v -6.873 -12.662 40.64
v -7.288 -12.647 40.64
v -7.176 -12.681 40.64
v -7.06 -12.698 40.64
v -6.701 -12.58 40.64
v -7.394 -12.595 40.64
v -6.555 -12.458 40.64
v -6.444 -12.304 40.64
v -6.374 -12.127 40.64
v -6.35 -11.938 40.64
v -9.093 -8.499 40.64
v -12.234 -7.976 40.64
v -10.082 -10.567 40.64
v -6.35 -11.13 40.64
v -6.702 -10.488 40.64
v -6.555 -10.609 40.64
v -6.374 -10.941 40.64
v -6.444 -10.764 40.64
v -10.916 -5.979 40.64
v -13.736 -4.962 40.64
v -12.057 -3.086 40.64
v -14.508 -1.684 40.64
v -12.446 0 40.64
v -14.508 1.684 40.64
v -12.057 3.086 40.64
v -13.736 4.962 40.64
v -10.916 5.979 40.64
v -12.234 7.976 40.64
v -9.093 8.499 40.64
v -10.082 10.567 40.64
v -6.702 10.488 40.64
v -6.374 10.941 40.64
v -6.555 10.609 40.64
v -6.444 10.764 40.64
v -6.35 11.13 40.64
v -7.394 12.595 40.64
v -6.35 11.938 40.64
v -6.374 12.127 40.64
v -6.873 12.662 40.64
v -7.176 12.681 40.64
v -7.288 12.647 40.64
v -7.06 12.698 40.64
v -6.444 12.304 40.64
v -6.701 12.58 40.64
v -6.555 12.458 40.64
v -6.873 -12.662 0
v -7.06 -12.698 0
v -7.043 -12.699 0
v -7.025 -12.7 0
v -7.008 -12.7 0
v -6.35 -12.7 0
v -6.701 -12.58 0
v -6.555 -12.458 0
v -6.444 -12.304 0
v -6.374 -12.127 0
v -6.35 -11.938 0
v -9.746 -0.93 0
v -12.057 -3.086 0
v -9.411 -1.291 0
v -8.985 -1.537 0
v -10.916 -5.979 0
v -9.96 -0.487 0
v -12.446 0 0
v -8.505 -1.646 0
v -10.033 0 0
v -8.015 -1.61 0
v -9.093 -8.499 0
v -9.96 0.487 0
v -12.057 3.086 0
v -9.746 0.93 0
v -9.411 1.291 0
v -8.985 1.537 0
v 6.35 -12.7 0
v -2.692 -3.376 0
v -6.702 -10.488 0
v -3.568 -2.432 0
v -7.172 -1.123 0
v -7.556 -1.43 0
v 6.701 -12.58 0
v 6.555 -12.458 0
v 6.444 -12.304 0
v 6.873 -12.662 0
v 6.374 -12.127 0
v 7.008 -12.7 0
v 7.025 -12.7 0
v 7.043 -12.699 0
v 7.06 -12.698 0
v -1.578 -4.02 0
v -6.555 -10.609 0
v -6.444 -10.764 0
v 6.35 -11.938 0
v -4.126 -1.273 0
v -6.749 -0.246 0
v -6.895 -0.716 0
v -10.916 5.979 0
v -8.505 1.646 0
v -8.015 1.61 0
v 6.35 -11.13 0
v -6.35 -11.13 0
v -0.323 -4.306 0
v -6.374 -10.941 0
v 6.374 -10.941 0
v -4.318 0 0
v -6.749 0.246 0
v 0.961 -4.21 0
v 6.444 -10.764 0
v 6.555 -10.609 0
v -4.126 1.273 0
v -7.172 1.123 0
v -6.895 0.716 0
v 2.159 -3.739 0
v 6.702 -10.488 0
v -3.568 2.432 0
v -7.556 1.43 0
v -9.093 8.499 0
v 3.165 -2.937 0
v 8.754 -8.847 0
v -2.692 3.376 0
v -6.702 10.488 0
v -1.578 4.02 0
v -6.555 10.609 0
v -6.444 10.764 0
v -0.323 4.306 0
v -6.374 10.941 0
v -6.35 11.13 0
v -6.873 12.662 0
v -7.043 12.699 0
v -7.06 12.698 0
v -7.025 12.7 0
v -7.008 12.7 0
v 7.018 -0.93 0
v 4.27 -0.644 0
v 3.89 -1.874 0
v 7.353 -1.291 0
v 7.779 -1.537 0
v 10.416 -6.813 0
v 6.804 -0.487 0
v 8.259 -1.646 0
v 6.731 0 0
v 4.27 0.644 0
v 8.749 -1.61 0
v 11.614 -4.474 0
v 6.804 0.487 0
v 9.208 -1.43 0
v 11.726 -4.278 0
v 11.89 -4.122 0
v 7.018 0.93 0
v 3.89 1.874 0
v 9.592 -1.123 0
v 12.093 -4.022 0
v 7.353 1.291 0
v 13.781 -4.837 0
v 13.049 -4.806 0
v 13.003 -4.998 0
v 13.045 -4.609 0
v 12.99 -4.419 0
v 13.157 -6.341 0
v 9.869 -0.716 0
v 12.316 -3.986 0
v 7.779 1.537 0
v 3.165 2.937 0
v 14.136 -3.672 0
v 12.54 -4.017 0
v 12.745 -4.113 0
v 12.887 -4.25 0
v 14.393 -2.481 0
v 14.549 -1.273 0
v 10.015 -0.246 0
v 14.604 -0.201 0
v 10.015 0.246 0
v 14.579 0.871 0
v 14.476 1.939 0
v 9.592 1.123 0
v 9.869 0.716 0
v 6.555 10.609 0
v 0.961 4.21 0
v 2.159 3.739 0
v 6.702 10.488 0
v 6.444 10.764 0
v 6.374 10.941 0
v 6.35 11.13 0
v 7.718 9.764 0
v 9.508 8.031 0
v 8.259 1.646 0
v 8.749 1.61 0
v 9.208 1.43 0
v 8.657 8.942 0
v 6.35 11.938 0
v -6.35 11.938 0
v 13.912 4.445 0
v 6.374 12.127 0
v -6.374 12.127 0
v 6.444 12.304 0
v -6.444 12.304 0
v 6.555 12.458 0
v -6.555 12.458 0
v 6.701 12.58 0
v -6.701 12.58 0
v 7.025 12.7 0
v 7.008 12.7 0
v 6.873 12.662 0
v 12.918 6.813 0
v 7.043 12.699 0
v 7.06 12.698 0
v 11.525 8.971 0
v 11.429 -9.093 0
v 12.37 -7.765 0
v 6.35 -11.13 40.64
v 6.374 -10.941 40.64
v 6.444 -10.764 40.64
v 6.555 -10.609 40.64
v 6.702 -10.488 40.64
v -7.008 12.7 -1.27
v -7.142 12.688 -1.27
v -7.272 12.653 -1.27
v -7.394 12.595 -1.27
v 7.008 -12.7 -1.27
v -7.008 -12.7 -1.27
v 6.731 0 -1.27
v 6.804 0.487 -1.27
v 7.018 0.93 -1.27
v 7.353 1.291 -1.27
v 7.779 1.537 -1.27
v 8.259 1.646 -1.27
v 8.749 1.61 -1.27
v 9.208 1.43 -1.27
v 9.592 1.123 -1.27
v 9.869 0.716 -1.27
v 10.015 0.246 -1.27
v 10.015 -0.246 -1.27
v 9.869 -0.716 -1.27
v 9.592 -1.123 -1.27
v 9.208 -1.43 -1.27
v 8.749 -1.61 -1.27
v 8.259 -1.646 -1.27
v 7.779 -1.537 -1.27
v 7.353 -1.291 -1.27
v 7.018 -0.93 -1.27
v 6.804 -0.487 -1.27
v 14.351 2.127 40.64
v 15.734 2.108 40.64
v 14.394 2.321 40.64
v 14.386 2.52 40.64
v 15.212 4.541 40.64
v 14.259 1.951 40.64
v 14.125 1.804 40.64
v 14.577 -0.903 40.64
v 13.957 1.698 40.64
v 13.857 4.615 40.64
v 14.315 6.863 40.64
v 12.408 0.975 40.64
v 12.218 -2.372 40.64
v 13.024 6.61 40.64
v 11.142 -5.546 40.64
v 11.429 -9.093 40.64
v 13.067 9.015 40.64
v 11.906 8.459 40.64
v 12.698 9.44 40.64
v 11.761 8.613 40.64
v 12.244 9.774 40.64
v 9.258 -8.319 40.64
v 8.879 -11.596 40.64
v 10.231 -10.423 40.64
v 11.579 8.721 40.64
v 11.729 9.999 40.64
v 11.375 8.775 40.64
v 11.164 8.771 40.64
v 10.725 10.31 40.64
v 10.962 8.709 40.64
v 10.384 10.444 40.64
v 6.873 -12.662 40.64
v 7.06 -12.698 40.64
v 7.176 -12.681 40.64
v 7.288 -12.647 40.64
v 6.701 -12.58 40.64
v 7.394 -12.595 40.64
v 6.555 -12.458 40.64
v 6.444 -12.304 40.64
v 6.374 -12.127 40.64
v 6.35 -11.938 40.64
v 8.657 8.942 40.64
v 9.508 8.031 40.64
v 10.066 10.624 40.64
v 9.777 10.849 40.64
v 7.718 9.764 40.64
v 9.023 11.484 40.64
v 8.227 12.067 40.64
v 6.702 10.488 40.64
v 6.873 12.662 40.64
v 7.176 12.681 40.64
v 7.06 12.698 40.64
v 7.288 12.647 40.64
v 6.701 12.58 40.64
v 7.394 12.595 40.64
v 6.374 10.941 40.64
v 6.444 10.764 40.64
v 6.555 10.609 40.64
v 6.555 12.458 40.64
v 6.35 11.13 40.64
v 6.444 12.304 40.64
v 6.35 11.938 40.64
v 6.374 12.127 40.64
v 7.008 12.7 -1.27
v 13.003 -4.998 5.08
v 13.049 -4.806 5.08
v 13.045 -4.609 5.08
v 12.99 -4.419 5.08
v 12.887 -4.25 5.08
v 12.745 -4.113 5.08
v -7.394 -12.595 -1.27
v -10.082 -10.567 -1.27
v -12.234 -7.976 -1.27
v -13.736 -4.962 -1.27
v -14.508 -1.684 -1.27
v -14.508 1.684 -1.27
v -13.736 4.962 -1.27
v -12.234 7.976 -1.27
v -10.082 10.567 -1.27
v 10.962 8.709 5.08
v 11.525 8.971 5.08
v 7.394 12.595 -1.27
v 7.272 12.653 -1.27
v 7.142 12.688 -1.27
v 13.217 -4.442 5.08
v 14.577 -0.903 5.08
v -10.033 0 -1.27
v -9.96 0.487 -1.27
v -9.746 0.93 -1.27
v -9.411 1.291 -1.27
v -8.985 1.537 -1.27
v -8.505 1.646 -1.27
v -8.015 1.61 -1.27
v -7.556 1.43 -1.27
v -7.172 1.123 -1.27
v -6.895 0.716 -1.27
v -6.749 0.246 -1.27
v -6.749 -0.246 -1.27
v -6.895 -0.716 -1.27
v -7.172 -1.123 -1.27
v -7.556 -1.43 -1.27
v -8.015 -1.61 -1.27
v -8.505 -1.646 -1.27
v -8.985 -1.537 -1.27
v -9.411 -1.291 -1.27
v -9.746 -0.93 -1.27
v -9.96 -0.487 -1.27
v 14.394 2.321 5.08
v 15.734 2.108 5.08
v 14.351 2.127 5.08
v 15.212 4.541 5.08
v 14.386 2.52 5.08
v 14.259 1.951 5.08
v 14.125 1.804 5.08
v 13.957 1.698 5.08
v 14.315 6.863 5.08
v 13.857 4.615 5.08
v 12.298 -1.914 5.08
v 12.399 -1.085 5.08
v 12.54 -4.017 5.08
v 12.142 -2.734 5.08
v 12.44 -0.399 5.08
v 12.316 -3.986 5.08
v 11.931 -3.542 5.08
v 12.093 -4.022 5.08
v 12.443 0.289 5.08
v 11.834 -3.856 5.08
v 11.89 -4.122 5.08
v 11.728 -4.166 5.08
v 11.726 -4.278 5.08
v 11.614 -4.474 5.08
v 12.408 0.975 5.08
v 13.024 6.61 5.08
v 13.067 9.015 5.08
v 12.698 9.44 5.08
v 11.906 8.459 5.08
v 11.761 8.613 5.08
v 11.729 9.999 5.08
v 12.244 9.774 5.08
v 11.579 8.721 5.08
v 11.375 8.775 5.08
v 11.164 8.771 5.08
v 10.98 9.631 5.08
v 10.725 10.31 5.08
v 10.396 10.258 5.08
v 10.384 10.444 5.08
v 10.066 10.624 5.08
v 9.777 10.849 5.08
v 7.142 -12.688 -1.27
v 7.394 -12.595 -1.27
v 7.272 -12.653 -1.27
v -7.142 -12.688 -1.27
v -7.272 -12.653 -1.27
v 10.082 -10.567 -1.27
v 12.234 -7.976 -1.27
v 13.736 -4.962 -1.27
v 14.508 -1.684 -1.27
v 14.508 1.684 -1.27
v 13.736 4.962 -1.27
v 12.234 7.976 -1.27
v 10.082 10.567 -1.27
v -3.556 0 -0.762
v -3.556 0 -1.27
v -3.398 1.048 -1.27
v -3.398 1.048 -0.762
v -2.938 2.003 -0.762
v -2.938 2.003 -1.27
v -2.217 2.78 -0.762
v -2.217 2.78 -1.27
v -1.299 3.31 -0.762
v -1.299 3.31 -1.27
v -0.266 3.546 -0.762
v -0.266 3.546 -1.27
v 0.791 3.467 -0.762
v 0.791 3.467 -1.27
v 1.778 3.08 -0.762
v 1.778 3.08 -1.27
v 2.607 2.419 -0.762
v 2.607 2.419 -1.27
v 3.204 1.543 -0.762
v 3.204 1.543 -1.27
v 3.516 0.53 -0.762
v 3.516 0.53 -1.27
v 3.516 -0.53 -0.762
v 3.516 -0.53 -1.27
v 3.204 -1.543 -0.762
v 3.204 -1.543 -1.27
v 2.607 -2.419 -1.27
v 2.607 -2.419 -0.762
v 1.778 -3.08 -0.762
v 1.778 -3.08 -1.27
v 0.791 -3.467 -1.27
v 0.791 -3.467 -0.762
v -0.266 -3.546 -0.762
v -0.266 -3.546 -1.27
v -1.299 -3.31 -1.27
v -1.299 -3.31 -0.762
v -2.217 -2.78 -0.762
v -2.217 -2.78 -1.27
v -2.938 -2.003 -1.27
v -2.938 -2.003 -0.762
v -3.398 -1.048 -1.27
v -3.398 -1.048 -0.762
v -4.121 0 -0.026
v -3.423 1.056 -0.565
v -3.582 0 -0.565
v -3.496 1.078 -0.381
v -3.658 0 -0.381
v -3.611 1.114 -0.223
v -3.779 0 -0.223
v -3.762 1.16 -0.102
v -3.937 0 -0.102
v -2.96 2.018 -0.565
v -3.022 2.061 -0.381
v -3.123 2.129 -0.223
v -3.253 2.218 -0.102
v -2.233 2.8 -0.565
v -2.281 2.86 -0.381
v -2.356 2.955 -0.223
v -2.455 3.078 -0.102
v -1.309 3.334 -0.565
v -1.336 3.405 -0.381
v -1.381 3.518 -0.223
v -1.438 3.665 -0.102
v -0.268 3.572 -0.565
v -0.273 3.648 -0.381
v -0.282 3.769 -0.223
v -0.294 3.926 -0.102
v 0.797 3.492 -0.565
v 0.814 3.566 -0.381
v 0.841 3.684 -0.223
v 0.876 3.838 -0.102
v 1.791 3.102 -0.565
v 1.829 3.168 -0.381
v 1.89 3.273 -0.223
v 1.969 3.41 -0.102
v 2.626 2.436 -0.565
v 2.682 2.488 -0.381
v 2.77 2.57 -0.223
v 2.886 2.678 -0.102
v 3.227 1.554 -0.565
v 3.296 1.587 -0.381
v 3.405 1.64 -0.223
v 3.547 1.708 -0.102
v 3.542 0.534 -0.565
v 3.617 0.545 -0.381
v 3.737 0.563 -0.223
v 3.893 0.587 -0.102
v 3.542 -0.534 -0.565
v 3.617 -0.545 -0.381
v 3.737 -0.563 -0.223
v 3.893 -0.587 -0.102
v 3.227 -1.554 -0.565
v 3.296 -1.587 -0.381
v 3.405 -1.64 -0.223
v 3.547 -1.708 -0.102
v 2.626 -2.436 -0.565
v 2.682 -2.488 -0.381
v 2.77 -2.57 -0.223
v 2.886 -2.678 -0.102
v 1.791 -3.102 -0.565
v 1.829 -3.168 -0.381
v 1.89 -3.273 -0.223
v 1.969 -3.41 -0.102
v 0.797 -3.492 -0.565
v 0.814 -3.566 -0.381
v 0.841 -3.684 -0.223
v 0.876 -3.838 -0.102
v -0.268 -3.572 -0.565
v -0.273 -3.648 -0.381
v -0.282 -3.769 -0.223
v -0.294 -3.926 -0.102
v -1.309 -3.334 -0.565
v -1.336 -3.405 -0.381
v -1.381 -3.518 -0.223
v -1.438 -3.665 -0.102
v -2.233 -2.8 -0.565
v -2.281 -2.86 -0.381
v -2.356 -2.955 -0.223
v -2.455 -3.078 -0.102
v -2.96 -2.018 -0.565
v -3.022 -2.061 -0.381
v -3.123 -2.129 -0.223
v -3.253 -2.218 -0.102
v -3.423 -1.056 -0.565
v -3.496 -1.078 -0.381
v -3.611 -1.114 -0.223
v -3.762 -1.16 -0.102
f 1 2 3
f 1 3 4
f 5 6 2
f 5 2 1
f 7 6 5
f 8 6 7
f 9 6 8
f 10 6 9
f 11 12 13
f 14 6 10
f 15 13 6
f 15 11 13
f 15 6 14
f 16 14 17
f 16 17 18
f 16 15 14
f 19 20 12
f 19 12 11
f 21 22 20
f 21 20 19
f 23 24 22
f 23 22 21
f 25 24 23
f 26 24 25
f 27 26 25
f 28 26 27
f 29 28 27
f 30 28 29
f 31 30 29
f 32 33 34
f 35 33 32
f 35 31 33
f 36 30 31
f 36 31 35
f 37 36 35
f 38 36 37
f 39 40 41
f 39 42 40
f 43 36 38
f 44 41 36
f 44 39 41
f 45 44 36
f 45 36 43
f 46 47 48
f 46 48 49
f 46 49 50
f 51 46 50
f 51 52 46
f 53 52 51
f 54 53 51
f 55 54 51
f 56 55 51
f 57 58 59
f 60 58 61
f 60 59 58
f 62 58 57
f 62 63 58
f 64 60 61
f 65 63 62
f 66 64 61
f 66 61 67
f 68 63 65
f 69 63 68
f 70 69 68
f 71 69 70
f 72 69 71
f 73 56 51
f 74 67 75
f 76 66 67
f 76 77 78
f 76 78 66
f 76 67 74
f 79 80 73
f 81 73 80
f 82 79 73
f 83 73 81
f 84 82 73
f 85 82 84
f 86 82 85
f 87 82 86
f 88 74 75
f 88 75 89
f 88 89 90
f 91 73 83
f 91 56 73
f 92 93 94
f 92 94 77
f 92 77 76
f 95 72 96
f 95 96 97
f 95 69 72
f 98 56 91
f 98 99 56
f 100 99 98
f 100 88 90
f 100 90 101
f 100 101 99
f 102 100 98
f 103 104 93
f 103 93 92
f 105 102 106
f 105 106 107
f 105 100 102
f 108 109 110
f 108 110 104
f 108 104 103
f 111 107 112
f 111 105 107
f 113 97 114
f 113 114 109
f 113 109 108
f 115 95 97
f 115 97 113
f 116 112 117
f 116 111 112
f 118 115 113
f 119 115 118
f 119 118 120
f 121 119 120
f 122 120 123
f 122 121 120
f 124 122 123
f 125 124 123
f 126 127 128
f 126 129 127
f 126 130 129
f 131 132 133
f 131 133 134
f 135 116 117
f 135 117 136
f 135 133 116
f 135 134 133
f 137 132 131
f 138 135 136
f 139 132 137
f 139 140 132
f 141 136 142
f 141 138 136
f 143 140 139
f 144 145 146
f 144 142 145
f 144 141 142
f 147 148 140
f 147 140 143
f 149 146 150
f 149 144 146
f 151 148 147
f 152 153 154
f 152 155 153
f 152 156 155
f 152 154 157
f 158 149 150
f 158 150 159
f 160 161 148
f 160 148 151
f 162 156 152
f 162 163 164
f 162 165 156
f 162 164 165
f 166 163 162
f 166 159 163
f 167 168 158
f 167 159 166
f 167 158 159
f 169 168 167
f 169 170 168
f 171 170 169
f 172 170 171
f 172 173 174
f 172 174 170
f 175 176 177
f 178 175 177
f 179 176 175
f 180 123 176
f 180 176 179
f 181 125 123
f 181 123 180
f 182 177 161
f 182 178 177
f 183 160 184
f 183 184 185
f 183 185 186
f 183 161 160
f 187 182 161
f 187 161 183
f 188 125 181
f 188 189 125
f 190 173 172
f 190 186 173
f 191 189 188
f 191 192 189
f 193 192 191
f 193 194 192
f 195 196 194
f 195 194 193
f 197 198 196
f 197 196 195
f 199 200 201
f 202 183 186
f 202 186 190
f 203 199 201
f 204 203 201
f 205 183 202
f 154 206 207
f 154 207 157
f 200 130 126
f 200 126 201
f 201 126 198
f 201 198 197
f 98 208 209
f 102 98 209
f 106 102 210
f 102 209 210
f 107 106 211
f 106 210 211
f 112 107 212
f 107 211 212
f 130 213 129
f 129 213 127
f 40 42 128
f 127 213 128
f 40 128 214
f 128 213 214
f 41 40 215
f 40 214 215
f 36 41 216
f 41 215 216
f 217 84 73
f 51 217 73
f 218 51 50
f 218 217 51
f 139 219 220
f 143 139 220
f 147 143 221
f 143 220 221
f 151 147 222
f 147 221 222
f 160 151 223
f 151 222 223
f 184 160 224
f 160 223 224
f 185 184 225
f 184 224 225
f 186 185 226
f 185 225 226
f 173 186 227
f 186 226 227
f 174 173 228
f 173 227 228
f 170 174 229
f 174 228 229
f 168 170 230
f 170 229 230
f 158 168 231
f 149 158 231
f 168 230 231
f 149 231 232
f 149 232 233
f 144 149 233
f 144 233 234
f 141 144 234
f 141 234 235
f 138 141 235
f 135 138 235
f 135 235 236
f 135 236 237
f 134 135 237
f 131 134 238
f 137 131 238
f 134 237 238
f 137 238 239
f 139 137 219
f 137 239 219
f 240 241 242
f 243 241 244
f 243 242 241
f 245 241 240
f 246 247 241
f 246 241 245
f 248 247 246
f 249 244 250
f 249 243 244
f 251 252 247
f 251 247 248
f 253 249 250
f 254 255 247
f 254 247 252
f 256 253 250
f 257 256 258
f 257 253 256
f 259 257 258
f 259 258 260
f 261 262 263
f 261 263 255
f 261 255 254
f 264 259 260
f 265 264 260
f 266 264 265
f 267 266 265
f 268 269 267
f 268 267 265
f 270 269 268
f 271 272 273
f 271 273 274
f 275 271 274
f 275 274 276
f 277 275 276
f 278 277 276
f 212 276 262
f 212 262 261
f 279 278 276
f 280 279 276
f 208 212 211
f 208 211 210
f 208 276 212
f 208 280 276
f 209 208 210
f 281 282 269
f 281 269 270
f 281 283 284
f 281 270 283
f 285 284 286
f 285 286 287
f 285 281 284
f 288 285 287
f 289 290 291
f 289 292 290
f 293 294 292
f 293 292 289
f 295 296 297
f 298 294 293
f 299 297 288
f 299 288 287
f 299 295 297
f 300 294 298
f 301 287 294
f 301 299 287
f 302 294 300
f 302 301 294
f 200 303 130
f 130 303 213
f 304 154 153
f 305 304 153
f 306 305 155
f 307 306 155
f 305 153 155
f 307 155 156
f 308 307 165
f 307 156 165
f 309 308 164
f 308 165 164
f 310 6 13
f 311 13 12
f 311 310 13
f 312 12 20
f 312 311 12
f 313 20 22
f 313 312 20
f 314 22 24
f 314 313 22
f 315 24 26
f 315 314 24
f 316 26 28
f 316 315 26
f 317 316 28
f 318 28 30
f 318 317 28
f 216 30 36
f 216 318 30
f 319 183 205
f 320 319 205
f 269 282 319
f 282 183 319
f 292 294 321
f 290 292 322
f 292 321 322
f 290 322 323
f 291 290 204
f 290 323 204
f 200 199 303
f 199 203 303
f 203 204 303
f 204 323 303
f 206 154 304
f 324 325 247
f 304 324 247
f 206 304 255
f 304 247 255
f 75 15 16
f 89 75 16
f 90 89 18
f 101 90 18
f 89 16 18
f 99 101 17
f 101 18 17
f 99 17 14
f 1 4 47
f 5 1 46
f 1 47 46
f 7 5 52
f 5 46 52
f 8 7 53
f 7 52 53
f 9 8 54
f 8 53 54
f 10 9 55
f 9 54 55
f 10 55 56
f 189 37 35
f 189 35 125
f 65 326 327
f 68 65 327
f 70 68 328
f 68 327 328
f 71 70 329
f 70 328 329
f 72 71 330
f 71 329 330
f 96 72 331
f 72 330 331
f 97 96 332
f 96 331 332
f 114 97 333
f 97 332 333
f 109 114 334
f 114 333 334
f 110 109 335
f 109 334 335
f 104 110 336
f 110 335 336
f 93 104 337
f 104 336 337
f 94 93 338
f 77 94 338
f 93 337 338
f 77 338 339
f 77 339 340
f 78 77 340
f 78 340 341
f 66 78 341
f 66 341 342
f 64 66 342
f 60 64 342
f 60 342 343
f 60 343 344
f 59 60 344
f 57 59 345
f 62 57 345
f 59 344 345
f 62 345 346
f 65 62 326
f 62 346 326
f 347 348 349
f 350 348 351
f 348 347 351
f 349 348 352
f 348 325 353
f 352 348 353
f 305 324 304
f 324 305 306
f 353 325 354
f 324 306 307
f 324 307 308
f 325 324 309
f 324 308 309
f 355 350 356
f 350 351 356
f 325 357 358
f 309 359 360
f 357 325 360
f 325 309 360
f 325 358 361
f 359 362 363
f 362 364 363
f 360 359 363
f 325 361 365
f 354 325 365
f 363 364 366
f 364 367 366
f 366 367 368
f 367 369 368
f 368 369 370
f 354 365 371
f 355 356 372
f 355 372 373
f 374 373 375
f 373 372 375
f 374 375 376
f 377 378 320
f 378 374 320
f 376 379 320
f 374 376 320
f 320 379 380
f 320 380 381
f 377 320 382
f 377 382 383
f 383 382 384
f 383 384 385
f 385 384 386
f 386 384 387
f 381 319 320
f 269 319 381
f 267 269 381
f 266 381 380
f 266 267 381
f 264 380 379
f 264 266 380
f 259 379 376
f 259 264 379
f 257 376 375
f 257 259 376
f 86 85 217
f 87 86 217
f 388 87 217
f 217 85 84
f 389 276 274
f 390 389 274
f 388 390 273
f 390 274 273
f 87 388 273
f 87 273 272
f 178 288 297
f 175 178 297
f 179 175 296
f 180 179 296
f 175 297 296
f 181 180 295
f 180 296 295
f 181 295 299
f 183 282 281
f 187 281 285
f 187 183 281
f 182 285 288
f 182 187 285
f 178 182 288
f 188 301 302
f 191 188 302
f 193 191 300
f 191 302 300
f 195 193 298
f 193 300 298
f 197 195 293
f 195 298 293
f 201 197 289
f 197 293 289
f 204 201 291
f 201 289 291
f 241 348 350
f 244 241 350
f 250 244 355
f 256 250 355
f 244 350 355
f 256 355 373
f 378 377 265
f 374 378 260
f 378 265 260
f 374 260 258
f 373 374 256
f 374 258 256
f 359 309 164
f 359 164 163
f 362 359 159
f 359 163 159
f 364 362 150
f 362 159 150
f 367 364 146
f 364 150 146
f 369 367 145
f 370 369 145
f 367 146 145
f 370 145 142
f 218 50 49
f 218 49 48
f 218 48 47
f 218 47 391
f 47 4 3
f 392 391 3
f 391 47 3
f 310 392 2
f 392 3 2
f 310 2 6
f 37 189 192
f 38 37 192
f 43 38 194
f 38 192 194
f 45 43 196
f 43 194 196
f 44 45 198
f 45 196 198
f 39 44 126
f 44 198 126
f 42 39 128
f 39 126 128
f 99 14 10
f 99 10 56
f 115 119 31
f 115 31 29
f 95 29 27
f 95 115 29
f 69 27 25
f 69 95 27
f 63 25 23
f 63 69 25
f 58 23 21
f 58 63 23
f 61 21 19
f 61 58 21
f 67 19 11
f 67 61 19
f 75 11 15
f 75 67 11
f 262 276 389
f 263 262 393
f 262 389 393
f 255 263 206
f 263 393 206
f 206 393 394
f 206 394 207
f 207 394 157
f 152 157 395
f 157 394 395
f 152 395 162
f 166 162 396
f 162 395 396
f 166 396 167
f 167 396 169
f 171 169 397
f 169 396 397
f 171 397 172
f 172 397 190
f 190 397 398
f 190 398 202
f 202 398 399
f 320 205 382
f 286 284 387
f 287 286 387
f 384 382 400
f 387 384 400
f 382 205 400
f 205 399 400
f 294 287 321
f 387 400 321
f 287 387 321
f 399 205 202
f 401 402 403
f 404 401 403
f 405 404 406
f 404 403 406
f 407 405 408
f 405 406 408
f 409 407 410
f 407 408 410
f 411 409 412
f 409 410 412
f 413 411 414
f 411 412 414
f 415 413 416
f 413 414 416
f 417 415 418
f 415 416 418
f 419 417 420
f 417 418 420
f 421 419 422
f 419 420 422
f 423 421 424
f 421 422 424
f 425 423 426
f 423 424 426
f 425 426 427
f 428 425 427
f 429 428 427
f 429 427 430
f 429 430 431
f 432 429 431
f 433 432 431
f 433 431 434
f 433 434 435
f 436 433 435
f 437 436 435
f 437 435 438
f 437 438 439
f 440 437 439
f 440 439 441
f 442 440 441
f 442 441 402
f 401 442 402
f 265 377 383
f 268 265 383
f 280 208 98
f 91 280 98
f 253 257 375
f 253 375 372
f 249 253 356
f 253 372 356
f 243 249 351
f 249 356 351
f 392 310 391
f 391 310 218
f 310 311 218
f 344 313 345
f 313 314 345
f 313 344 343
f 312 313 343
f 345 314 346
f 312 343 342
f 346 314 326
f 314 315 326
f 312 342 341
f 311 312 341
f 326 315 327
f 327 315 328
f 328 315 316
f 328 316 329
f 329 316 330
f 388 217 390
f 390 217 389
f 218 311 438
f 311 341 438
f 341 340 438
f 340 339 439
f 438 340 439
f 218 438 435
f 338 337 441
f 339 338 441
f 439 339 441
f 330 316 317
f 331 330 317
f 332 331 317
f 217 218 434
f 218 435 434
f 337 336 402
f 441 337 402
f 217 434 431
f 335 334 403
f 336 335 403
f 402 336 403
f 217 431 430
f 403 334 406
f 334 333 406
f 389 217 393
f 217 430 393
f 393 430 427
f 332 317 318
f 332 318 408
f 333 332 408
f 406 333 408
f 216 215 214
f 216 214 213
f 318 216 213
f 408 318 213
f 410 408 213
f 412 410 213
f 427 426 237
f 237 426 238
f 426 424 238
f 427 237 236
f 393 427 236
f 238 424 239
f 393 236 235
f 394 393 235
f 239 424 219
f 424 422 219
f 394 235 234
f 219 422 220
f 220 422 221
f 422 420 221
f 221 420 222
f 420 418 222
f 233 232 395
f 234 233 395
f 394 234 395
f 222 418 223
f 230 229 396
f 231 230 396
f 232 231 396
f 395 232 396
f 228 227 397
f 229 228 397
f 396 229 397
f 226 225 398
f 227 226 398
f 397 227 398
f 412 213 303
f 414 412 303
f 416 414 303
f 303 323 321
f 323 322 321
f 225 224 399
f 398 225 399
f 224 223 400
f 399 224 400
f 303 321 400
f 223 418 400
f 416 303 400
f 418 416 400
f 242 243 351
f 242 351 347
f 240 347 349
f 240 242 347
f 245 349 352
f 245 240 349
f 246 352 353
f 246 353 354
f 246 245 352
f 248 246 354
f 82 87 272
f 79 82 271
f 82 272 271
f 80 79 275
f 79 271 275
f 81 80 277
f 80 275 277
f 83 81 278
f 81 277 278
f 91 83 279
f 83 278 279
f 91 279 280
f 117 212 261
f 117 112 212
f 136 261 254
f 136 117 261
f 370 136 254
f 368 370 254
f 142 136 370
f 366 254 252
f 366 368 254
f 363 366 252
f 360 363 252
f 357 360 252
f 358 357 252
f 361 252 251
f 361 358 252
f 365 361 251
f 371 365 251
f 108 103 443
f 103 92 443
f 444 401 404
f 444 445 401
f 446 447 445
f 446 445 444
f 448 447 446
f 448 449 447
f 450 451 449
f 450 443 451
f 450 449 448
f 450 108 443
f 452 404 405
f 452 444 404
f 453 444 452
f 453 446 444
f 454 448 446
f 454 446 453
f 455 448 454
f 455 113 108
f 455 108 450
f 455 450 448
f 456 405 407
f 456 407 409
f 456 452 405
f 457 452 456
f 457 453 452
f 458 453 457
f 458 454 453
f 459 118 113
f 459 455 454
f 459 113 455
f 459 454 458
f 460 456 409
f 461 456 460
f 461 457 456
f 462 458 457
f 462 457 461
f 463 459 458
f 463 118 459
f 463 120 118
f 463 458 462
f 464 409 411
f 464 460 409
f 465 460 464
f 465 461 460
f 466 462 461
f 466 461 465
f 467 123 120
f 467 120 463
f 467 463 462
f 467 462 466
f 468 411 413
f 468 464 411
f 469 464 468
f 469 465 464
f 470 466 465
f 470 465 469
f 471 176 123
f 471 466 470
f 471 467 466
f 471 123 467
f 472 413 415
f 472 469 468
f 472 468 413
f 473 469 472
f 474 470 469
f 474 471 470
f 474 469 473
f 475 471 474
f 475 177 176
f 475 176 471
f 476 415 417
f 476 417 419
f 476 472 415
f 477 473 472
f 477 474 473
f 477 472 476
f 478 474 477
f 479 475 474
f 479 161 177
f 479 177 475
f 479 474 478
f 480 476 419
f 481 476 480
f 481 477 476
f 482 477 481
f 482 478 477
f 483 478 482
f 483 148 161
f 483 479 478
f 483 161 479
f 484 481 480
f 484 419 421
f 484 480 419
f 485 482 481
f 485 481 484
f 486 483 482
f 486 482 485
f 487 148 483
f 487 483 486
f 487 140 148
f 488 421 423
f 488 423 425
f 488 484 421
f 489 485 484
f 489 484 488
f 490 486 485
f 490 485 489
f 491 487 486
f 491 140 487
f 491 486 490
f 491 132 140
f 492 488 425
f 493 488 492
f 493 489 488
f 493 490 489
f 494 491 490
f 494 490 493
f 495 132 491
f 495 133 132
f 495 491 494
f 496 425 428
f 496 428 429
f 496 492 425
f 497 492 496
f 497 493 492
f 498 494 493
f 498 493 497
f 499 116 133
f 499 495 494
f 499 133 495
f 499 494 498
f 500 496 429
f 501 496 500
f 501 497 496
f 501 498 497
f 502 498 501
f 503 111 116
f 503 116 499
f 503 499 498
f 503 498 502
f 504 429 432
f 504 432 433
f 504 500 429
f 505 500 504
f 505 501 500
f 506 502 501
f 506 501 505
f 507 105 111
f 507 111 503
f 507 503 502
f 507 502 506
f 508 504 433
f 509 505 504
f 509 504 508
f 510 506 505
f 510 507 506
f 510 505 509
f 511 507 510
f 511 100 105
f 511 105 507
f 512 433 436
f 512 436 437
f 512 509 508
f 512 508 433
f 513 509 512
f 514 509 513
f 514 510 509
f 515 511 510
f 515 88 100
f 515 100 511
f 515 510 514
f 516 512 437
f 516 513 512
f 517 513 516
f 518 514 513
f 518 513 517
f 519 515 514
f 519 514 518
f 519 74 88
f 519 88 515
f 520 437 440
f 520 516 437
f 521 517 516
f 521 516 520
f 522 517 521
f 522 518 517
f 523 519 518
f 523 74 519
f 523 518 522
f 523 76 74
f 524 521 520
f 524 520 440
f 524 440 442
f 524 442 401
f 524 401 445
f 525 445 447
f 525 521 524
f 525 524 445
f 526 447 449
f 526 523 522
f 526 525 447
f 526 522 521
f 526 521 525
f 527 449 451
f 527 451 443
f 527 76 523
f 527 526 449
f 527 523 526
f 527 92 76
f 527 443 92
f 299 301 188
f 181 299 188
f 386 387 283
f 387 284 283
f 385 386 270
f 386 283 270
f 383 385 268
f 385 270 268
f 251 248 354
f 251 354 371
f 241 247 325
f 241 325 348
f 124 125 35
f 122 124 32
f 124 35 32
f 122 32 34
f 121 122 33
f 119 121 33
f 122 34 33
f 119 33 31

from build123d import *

# Parameters (mm, degrees)
SKETCH1_R           = 14.605
SKETCH1_R_2         = 12.446
BOSS_EXTRUDE1_DEPTH = 40.64
BOSS_EXTRUDE2_START = 1.27
SKETCH2_R           = 14.605
SKETCH2_R_2         = 3.556
SKETCH2_R_3         = 1.651
BOSS_EXTRUDE2_DEPTH = 1.27
SKETCH3_W           = 34.056453184
SKETCH3_H           = 6.418177278
SKETCH3_W_2         = 34.979066167
SKETCH3_H_2         = 5.575791511
CUT_EXTRUDE1_DEPTH  = 47.723229233
SKETCH4_W           = 12.7
SKETCH4_H           = 40.64
CUT_EXTRUDE2_DEPTH  = 51.100654936
CUT_EXTRUDE3_DEPTH  = 40.64
BOSS_EXTRUDE3_DEPTH = 41.91
SKETCH7_R           = 15.875
SKETCH7_R_2         = 14.605
CUT_EXTRUDE4_DEPTH  = 6.35
CUT_EXTRUDE5_DEPTH  = 5.08
CUT_EXTRUDE6_REACH  = 48.533
BOSS_EXTRUDE5_DEPTH = 35.56
FILLET1_R           = 0.762
FILLET2_R           = 2.54


with BuildPart() as part:
    # Sketch1 → Boss-Extrude1 (new body)
    with BuildSketch(Plane.XY):
        Circle(SKETCH1_R)
        Circle(SKETCH1_R_2, mode=Mode.SUBTRACT)
    extrude(amount=BOSS_EXTRUDE1_DEPTH)

    # Sketch2 → Boss-Extrude2 (add)
    with BuildSketch(Plane(origin=(0, 0, 0), x_dir=(-1, 0, 0), z_dir=(0, 0, -1)).offset(BOSS_EXTRUDE2_START)):
        Circle(SKETCH2_R)
        Circle(SKETCH2_R_2, mode=Mode.SUBTRACT)
        with Locations((-8.382, 0)):
            Circle(SKETCH2_R_3, mode=Mode.SUBTRACT)
        with Locations((8.382, 0)):
            Circle(SKETCH2_R_3, mode=Mode.SUBTRACT)
    extrude(amount=-BOSS_EXTRUDE2_DEPTH)

    # Sketch3 → Cut-Extrude1 (cut, through all)
    with BuildSketch(Plane(origin=(0, 0, -1.27), x_dir=(-1, 0, 0), z_dir=(0, 0, -1))):
        with Locations((0.581647316, 15.909088639)):
            Rectangle(SKETCH3_W, SKETCH3_H)
        with Locations((1.042953807, -15.487895756)):
            Rectangle(SKETCH3_W_2, SKETCH3_H_2)
    extrude(amount=-CUT_EXTRUDE1_DEPTH, mode=Mode.SUBTRACT)

    # Sketch4 → Cut-Extrude2 (cut, through all)
    with BuildSketch(Plane(origin=(0, 12.7, 0), x_dir=(1, 0, 0), z_dir=(0, 1, 0))):
        with Locations((0, -20.32)):
            Rectangle(SKETCH4_W, SKETCH4_H)
    extrude(amount=-CUT_EXTRUDE2_DEPTH, mode=Mode.SUBTRACT)

    # Sketch5 → Cut-Extrude3 (cut)
    with BuildSketch(Plane.XY.offset(40.64)):
        Polygon((8.706975565, 7.656948551), (15.156085268, 10.664217794), (18.376436422, 3.758152456), (11.927326719, 0.750883214), align=None)
    extrude(amount=-CUT_EXTRUDE3_DEPTH, mode=Mode.SUBTRACT)

    # Sketch6 → Boss-Extrude3 (add)
    with BuildSketch(Plane(origin=(0, 0, -1.27), x_dir=(-1, 0, 0), z_dir=(0, 0, -1))):
        with BuildLine():
            Line((-12.527218586, 9.751124012), (-10.16966665, 10.48255242))
            ThreePointArc((-10.16966665, 10.48255242), (-10.873649709, 9.75037266), (-11.525041099, 8.971034091))
            ThreePointArc((-11.525041099, 8.971034091), (-13.467409843, 5.651096984), (-14.475687068, 1.93920316))
            ThreePointArc((-14.475687068, 1.93920316), (-14.575462242, 0.928399389), (-14.604741501, -0.086894693))
            Line((-14.604741501, -0.086894693), (-15.734442466, 2.107829522))
            ThreePointArc((-15.734442466, 2.107829522), (-14.638488959, 6.142496722), (-12.527218586, 9.751124012))
        make_face()
    extrude(amount=-BOSS_EXTRUDE3_DEPTH)

    # Sketch7 → Cut-Extrude4 (cut)
    with BuildSketch(Plane(origin=(0, 0, -1.27), x_dir=(-1, 0, 0), z_dir=(0, 0, -1))):
        Circle(SKETCH7_R)
        Circle(SKETCH7_R_2, mode=Mode.SUBTRACT)
    extrude(amount=-CUT_EXTRUDE4_DEPTH, mode=Mode.SUBTRACT)

    # Sketch8 → Cut-Extrude5 (cut)
    with BuildSketch(Plane.XY):
        with BuildLine():
            Line((14.475687068, 1.93920316), (12.407758156, 0.974912072))
            ThreePointArc((12.407758156, 0.974912072), (12.445878018, -0.05510311), (12.398639212, -1.084740374))
            Line((12.398639212, -1.084740374), (14.549423566, -1.272909623))
            ThreePointArc((14.549423566, -1.272909623), (14.601153344, 0.335180604), (14.475687068, 1.93920316))
        make_face()
        with BuildLine():
            Line((14.549423566, -1.272909623), (12.398639212, -1.084740374))
            ThreePointArc((12.398639212, -1.084740374), (12.226851946, -2.325297292), (11.931259886, -3.542309069))
            Line((11.931259886, -3.542309069), (13.780666558, -4.837277563))
            ThreePointArc((13.780666558, -4.837277563), (14.276718156, -3.079179062), (14.549423566, -1.272909623))
        make_face()
    extrude(amount=CUT_EXTRUDE5_DEPTH, mode=Mode.SUBTRACT)

    # Cut-Extrude6: up to this face of the body (flat: up to its plane)
    cut_extrude6_end = Plane(part.part.faces().sort_by_distance((9.524357094, -7.422304107, 0))[0])
    # Sketch11 → Cut-Extrude6 (cut, up to the picked face)
    with BuildSketch(Plane.XY.offset(40.64), mode=Mode.PRIVATE) as cut_extrude6_sk1:
        Polygon((15.734442466, 2.107829522), (11.428920073, -9.093173867), (14.392518886, -10.232343334), (18.698041279, 0.968660056), align=None)
    cut_extrude6_tool1 = split(extrude(cut_extrude6_sk1.sketch, amount=-CUT_EXTRUDE6_REACH, mode=Mode.PRIVATE), bisect_by=cut_extrude6_end, keep=Keep.BOTH, mode=Mode.PRIVATE)
    add(cut_extrude6_tool1.solids().sort_by(Axis((15.063481, -4.062257, 40.64), (0, 0, -1)))[0], mode=Mode.SUBTRACT)

    # Sketch12 → Boss-Extrude5 (add)
    with BuildSketch(Plane.XY.offset(40.64)):
        Polygon((14.577046288, -0.903186872), (15.734442466, 2.107829522), (15.155744377, 2.330273663), (13.998348199, -0.680742731), align=None)
    extrude(amount=-BOSS_EXTRUDE5_DEPTH)

    # Fillet1
    # the kernel refuses this fillet: 0.762 mm, written as the material it adds along each edge
    with BuildSketch(Plane(origin=(14.475687068, 1.93920316, 40.64), x_dir=(-0.1526781379658876, 0.9882759666142191, 0), z_dir=(0, 0, -1))) as fillet1_piece_1:
        with BuildLine():
            CenterArc((0.57198511, -0.76184596), FILLET1_R, 88.847914045, 74.934246566)
            Line((-0.159692452, -0.549026914), (0, 0))
            ThreePointArc((0, 0), (0.29365307, 0.002952442), (0.587306139, 0))
        make_face()
    extrude(amount=35.56)
    with BuildSketch(Plane(origin=(11.525041099, 8.971034091, 40.64), x_dir=(0.5968718617370223, -0.8023365756754336, 0), z_dir=(0, 0, -1))) as fillet1_piece_2:
        with BuildLine():
            CenterArc((0.62099819, 0.761818426), FILLET1_R, 191.646188227, 79.60463439)
            Line((-0.12531439, 0.60799537), (0, 0))
            ThreePointArc((0, 0), (0.318816035, -0.00348017), (0.63763207, 0))
        make_face()
    extrude(amount=35.56)
    # the kernel refuses this fillet: 0.762 mm, written as the material it takes off along each edge
    with BuildSketch(Plane(origin=(0, 0, 0), x_dir=(-1, 0, 0), z_dir=(0, -1, 0))) as fillet1_2_piece_1:
        with BuildLine():
            CenterArc((3.556 + FILLET1_R, FILLET1_R), FILLET1_R, 180, 90)
            Line((3.556, FILLET1_R), (3.556, 0))
            Line((3.556, 0), (3.556 + FILLET1_R, 0))
        make_face()
    revolve(axis=Axis((0, 0, 0), (0, 0, -1)), mode=Mode.SUBTRACT)
    with BuildSketch(Plane(origin=(11.931259886, -3.542309069, 0), x_dir=(-0.32230782021248533, -0.9466349185561855, 0), z_dir=(0, 0, 1))) as fillet1_2_piece_2:
        with BuildLine():
            CenterArc((1.014668485, 0.761403744), FILLET1_R, 163.802549626, 103.930693134)
            Line((0.282915237, 0.973962404), (0, 0))
            ThreePointArc((0, 0), (0.492264909, 0.009738855), (0.984529818, 0))
        make_face()
    extrude(amount=5.08, mode=Mode.SUBTRACT)
    with BuildSketch(Plane(origin=(13.216640292, -4.442342119, 0), x_dir=(-0.35879353276176223, -0.9334169490899199, 0), z_dir=(0, 0, 1))) as fillet1_2_piece_3:
        with BuildLine():
            CenterArc((FILLET1_R * 0.781652785228, -FILLET1_R), FILLET1_R, 90, 76.026121217)
            Line((-FILLET1_R * 0.1887531327, -FILLET1_R * 0.758520488551), (0, 0))
            Line((0, 0), (FILLET1_R * 0.781652785228, 0))
        make_face()
    extrude(amount=5.08, mode=Mode.SUBTRACT)
    with BuildSketch(Plane(origin=(-7.212213599, 12.7, -1.794261411), x_dir=(1, 0, 0), z_dir=(0, 0, 1)), Plane(origin=(-7.212213599, -12.7, 41.164261411), x_dir=(1, 0, 0), z_dir=(0, 0, -1))) as fillet1_2_piece_4:
        with BuildLine():
            CenterArc((0.204160731, -0.762), FILLET1_R, 90, 30.414529102)
            ThreePointArc((-0.181603647, -0.104862385), (-0.090990033, -0.052105246), (0, 0))
            Line((0, 0), (0.204160731, 0))
        make_face()
    extrude(amount=42.958522823, mode=Mode.SUBTRACT)
    with BuildSketch(Plane(origin=(7.212213599, 12.7, -1.794261411), x_dir=(0.8659975867148599, -0.500048177482969, -1.8558242316030044e-14), z_dir=(0, 0, 1)), Plane(origin=(7.212213599, -12.7, 41.164261411), x_dir=(0.8659975867148587, 0.5000481774829708, -1.8313973834794986e-14), z_dir=(0, 0, -1))) as fillet1_2_piece_5:
        with BuildLine():
            CenterArc((0.204234011, -0.761980363), FILLET1_R, 89.588658346, 30.414529102)
            Line((-0.176802701, -0.102090202), (0, 0))
            ThreePointArc((0, 0), (0.104852282, 0.000376383), (0.209704565, 0))
        make_face()
    extrude(amount=42.958522823, mode=Mode.SUBTRACT)
    with BuildSketch(Plane(origin=(-6.35, 10.704224213, 41.703745389), x_dir=(0, 1, 0), z_dir=(0, 0, -1))) as fillet1_2_piece_6:
        with BuildLine():
            CenterArc((0.425498156, -0.762), FILLET1_R, 90, 57.421029607)
            ThreePointArc((-0.216601212, -0.351692308), (-0.106841566, -0.176744751), (0, 0))
            Line((0, 0), (0.425498156, 0))
        make_face()
    extrude(amount=41.703745389, mode=Mode.SUBTRACT)
    with BuildSketch(Plane(origin=(-6.35, -10.704224213, 41.703745389), x_dir=(0, -1, 0), z_dir=(0, 0, -1)), Plane(origin=(6.35, 10.704224213, 41.703745389), x_dir=(0, 1, 0), z_dir=(0, 0, -1))) as fillet1_2_piece_7:
        with BuildLine():
            CenterArc((0.425498156, 0.762), FILLET1_R, 212.578970393, 57.421029607)
            ThreePointArc((-0.216601212, 0.351692308), (-0.106841566, 0.176744751), (0, 0))
            Line((0, 0), (0.425498156, 0))
        make_face()
    extrude(amount=41.703745389, mode=Mode.SUBTRACT)
    with BuildSketch(Plane(origin=(6.35, -10.704224213, 41.703745389), x_dir=(0.8514689576122441, 0.5244050097231324, 0), z_dir=(0, 0, -1))) as fillet1_2_piece_8:
        with BuildLine():
            CenterArc((0.425685981, 0.761895088), FILLET1_R, 211.628197432, 57.421029608)
            Line((-0.223133364, 0.362298471), (0, 0))
            ThreePointArc((0, 0), (0.206520922, 0.001713556), (0.413041843, 0))
        make_face()
    extrude(amount=41.703745389, mode=Mode.SUBTRACT)
    with BuildSketch(Plane(origin=(6.35, -12.7, 42.545), x_dir=(1, 0, 0), z_dir=(0, 0, -1)), Plane(origin=(-6.35, -12.7, 0), x_dir=(-1, 0, 0), z_dir=(0, 0, 1))) as fillet1_2_piece_9:
        with BuildLine():
            CenterArc((FILLET1_R, -FILLET1_R), FILLET1_R, 90, 90)
            Line((0, -FILLET1_R), (0, 0))
            Line((0, 0), (FILLET1_R, 0))
        make_face()
    extrude(amount=42.545, mode=Mode.SUBTRACT)
    with BuildSketch(Plane(origin=(-6.35, 12.7, 0), x_dir=(-1, 0, 0), z_dir=(0, 0, 1)), Plane(origin=(6.35, 12.7, 42.545), x_dir=(1, 0, 0), z_dir=(0, 0, -1))) as fillet1_2_piece_10:
        with BuildLine():
            CenterArc((FILLET1_R, FILLET1_R), FILLET1_R, 180, 90)
            Line((0, FILLET1_R), (0, 0))
            Line((0, 0), (FILLET1_R, 0))
        make_face()
    extrude(amount=42.545, mode=Mode.SUBTRACT)

    # Fillet2
    fillet2_edges = [part.edges().sort_by_distance(p)[0] for p in [
        (12.527218586, 9.751124012, 22.86),
        (10.16966665, 10.48255242, 22.86),
    ]]
    fillet(fillet2_edges, radius=FILLET2_R)


solid = part.part
